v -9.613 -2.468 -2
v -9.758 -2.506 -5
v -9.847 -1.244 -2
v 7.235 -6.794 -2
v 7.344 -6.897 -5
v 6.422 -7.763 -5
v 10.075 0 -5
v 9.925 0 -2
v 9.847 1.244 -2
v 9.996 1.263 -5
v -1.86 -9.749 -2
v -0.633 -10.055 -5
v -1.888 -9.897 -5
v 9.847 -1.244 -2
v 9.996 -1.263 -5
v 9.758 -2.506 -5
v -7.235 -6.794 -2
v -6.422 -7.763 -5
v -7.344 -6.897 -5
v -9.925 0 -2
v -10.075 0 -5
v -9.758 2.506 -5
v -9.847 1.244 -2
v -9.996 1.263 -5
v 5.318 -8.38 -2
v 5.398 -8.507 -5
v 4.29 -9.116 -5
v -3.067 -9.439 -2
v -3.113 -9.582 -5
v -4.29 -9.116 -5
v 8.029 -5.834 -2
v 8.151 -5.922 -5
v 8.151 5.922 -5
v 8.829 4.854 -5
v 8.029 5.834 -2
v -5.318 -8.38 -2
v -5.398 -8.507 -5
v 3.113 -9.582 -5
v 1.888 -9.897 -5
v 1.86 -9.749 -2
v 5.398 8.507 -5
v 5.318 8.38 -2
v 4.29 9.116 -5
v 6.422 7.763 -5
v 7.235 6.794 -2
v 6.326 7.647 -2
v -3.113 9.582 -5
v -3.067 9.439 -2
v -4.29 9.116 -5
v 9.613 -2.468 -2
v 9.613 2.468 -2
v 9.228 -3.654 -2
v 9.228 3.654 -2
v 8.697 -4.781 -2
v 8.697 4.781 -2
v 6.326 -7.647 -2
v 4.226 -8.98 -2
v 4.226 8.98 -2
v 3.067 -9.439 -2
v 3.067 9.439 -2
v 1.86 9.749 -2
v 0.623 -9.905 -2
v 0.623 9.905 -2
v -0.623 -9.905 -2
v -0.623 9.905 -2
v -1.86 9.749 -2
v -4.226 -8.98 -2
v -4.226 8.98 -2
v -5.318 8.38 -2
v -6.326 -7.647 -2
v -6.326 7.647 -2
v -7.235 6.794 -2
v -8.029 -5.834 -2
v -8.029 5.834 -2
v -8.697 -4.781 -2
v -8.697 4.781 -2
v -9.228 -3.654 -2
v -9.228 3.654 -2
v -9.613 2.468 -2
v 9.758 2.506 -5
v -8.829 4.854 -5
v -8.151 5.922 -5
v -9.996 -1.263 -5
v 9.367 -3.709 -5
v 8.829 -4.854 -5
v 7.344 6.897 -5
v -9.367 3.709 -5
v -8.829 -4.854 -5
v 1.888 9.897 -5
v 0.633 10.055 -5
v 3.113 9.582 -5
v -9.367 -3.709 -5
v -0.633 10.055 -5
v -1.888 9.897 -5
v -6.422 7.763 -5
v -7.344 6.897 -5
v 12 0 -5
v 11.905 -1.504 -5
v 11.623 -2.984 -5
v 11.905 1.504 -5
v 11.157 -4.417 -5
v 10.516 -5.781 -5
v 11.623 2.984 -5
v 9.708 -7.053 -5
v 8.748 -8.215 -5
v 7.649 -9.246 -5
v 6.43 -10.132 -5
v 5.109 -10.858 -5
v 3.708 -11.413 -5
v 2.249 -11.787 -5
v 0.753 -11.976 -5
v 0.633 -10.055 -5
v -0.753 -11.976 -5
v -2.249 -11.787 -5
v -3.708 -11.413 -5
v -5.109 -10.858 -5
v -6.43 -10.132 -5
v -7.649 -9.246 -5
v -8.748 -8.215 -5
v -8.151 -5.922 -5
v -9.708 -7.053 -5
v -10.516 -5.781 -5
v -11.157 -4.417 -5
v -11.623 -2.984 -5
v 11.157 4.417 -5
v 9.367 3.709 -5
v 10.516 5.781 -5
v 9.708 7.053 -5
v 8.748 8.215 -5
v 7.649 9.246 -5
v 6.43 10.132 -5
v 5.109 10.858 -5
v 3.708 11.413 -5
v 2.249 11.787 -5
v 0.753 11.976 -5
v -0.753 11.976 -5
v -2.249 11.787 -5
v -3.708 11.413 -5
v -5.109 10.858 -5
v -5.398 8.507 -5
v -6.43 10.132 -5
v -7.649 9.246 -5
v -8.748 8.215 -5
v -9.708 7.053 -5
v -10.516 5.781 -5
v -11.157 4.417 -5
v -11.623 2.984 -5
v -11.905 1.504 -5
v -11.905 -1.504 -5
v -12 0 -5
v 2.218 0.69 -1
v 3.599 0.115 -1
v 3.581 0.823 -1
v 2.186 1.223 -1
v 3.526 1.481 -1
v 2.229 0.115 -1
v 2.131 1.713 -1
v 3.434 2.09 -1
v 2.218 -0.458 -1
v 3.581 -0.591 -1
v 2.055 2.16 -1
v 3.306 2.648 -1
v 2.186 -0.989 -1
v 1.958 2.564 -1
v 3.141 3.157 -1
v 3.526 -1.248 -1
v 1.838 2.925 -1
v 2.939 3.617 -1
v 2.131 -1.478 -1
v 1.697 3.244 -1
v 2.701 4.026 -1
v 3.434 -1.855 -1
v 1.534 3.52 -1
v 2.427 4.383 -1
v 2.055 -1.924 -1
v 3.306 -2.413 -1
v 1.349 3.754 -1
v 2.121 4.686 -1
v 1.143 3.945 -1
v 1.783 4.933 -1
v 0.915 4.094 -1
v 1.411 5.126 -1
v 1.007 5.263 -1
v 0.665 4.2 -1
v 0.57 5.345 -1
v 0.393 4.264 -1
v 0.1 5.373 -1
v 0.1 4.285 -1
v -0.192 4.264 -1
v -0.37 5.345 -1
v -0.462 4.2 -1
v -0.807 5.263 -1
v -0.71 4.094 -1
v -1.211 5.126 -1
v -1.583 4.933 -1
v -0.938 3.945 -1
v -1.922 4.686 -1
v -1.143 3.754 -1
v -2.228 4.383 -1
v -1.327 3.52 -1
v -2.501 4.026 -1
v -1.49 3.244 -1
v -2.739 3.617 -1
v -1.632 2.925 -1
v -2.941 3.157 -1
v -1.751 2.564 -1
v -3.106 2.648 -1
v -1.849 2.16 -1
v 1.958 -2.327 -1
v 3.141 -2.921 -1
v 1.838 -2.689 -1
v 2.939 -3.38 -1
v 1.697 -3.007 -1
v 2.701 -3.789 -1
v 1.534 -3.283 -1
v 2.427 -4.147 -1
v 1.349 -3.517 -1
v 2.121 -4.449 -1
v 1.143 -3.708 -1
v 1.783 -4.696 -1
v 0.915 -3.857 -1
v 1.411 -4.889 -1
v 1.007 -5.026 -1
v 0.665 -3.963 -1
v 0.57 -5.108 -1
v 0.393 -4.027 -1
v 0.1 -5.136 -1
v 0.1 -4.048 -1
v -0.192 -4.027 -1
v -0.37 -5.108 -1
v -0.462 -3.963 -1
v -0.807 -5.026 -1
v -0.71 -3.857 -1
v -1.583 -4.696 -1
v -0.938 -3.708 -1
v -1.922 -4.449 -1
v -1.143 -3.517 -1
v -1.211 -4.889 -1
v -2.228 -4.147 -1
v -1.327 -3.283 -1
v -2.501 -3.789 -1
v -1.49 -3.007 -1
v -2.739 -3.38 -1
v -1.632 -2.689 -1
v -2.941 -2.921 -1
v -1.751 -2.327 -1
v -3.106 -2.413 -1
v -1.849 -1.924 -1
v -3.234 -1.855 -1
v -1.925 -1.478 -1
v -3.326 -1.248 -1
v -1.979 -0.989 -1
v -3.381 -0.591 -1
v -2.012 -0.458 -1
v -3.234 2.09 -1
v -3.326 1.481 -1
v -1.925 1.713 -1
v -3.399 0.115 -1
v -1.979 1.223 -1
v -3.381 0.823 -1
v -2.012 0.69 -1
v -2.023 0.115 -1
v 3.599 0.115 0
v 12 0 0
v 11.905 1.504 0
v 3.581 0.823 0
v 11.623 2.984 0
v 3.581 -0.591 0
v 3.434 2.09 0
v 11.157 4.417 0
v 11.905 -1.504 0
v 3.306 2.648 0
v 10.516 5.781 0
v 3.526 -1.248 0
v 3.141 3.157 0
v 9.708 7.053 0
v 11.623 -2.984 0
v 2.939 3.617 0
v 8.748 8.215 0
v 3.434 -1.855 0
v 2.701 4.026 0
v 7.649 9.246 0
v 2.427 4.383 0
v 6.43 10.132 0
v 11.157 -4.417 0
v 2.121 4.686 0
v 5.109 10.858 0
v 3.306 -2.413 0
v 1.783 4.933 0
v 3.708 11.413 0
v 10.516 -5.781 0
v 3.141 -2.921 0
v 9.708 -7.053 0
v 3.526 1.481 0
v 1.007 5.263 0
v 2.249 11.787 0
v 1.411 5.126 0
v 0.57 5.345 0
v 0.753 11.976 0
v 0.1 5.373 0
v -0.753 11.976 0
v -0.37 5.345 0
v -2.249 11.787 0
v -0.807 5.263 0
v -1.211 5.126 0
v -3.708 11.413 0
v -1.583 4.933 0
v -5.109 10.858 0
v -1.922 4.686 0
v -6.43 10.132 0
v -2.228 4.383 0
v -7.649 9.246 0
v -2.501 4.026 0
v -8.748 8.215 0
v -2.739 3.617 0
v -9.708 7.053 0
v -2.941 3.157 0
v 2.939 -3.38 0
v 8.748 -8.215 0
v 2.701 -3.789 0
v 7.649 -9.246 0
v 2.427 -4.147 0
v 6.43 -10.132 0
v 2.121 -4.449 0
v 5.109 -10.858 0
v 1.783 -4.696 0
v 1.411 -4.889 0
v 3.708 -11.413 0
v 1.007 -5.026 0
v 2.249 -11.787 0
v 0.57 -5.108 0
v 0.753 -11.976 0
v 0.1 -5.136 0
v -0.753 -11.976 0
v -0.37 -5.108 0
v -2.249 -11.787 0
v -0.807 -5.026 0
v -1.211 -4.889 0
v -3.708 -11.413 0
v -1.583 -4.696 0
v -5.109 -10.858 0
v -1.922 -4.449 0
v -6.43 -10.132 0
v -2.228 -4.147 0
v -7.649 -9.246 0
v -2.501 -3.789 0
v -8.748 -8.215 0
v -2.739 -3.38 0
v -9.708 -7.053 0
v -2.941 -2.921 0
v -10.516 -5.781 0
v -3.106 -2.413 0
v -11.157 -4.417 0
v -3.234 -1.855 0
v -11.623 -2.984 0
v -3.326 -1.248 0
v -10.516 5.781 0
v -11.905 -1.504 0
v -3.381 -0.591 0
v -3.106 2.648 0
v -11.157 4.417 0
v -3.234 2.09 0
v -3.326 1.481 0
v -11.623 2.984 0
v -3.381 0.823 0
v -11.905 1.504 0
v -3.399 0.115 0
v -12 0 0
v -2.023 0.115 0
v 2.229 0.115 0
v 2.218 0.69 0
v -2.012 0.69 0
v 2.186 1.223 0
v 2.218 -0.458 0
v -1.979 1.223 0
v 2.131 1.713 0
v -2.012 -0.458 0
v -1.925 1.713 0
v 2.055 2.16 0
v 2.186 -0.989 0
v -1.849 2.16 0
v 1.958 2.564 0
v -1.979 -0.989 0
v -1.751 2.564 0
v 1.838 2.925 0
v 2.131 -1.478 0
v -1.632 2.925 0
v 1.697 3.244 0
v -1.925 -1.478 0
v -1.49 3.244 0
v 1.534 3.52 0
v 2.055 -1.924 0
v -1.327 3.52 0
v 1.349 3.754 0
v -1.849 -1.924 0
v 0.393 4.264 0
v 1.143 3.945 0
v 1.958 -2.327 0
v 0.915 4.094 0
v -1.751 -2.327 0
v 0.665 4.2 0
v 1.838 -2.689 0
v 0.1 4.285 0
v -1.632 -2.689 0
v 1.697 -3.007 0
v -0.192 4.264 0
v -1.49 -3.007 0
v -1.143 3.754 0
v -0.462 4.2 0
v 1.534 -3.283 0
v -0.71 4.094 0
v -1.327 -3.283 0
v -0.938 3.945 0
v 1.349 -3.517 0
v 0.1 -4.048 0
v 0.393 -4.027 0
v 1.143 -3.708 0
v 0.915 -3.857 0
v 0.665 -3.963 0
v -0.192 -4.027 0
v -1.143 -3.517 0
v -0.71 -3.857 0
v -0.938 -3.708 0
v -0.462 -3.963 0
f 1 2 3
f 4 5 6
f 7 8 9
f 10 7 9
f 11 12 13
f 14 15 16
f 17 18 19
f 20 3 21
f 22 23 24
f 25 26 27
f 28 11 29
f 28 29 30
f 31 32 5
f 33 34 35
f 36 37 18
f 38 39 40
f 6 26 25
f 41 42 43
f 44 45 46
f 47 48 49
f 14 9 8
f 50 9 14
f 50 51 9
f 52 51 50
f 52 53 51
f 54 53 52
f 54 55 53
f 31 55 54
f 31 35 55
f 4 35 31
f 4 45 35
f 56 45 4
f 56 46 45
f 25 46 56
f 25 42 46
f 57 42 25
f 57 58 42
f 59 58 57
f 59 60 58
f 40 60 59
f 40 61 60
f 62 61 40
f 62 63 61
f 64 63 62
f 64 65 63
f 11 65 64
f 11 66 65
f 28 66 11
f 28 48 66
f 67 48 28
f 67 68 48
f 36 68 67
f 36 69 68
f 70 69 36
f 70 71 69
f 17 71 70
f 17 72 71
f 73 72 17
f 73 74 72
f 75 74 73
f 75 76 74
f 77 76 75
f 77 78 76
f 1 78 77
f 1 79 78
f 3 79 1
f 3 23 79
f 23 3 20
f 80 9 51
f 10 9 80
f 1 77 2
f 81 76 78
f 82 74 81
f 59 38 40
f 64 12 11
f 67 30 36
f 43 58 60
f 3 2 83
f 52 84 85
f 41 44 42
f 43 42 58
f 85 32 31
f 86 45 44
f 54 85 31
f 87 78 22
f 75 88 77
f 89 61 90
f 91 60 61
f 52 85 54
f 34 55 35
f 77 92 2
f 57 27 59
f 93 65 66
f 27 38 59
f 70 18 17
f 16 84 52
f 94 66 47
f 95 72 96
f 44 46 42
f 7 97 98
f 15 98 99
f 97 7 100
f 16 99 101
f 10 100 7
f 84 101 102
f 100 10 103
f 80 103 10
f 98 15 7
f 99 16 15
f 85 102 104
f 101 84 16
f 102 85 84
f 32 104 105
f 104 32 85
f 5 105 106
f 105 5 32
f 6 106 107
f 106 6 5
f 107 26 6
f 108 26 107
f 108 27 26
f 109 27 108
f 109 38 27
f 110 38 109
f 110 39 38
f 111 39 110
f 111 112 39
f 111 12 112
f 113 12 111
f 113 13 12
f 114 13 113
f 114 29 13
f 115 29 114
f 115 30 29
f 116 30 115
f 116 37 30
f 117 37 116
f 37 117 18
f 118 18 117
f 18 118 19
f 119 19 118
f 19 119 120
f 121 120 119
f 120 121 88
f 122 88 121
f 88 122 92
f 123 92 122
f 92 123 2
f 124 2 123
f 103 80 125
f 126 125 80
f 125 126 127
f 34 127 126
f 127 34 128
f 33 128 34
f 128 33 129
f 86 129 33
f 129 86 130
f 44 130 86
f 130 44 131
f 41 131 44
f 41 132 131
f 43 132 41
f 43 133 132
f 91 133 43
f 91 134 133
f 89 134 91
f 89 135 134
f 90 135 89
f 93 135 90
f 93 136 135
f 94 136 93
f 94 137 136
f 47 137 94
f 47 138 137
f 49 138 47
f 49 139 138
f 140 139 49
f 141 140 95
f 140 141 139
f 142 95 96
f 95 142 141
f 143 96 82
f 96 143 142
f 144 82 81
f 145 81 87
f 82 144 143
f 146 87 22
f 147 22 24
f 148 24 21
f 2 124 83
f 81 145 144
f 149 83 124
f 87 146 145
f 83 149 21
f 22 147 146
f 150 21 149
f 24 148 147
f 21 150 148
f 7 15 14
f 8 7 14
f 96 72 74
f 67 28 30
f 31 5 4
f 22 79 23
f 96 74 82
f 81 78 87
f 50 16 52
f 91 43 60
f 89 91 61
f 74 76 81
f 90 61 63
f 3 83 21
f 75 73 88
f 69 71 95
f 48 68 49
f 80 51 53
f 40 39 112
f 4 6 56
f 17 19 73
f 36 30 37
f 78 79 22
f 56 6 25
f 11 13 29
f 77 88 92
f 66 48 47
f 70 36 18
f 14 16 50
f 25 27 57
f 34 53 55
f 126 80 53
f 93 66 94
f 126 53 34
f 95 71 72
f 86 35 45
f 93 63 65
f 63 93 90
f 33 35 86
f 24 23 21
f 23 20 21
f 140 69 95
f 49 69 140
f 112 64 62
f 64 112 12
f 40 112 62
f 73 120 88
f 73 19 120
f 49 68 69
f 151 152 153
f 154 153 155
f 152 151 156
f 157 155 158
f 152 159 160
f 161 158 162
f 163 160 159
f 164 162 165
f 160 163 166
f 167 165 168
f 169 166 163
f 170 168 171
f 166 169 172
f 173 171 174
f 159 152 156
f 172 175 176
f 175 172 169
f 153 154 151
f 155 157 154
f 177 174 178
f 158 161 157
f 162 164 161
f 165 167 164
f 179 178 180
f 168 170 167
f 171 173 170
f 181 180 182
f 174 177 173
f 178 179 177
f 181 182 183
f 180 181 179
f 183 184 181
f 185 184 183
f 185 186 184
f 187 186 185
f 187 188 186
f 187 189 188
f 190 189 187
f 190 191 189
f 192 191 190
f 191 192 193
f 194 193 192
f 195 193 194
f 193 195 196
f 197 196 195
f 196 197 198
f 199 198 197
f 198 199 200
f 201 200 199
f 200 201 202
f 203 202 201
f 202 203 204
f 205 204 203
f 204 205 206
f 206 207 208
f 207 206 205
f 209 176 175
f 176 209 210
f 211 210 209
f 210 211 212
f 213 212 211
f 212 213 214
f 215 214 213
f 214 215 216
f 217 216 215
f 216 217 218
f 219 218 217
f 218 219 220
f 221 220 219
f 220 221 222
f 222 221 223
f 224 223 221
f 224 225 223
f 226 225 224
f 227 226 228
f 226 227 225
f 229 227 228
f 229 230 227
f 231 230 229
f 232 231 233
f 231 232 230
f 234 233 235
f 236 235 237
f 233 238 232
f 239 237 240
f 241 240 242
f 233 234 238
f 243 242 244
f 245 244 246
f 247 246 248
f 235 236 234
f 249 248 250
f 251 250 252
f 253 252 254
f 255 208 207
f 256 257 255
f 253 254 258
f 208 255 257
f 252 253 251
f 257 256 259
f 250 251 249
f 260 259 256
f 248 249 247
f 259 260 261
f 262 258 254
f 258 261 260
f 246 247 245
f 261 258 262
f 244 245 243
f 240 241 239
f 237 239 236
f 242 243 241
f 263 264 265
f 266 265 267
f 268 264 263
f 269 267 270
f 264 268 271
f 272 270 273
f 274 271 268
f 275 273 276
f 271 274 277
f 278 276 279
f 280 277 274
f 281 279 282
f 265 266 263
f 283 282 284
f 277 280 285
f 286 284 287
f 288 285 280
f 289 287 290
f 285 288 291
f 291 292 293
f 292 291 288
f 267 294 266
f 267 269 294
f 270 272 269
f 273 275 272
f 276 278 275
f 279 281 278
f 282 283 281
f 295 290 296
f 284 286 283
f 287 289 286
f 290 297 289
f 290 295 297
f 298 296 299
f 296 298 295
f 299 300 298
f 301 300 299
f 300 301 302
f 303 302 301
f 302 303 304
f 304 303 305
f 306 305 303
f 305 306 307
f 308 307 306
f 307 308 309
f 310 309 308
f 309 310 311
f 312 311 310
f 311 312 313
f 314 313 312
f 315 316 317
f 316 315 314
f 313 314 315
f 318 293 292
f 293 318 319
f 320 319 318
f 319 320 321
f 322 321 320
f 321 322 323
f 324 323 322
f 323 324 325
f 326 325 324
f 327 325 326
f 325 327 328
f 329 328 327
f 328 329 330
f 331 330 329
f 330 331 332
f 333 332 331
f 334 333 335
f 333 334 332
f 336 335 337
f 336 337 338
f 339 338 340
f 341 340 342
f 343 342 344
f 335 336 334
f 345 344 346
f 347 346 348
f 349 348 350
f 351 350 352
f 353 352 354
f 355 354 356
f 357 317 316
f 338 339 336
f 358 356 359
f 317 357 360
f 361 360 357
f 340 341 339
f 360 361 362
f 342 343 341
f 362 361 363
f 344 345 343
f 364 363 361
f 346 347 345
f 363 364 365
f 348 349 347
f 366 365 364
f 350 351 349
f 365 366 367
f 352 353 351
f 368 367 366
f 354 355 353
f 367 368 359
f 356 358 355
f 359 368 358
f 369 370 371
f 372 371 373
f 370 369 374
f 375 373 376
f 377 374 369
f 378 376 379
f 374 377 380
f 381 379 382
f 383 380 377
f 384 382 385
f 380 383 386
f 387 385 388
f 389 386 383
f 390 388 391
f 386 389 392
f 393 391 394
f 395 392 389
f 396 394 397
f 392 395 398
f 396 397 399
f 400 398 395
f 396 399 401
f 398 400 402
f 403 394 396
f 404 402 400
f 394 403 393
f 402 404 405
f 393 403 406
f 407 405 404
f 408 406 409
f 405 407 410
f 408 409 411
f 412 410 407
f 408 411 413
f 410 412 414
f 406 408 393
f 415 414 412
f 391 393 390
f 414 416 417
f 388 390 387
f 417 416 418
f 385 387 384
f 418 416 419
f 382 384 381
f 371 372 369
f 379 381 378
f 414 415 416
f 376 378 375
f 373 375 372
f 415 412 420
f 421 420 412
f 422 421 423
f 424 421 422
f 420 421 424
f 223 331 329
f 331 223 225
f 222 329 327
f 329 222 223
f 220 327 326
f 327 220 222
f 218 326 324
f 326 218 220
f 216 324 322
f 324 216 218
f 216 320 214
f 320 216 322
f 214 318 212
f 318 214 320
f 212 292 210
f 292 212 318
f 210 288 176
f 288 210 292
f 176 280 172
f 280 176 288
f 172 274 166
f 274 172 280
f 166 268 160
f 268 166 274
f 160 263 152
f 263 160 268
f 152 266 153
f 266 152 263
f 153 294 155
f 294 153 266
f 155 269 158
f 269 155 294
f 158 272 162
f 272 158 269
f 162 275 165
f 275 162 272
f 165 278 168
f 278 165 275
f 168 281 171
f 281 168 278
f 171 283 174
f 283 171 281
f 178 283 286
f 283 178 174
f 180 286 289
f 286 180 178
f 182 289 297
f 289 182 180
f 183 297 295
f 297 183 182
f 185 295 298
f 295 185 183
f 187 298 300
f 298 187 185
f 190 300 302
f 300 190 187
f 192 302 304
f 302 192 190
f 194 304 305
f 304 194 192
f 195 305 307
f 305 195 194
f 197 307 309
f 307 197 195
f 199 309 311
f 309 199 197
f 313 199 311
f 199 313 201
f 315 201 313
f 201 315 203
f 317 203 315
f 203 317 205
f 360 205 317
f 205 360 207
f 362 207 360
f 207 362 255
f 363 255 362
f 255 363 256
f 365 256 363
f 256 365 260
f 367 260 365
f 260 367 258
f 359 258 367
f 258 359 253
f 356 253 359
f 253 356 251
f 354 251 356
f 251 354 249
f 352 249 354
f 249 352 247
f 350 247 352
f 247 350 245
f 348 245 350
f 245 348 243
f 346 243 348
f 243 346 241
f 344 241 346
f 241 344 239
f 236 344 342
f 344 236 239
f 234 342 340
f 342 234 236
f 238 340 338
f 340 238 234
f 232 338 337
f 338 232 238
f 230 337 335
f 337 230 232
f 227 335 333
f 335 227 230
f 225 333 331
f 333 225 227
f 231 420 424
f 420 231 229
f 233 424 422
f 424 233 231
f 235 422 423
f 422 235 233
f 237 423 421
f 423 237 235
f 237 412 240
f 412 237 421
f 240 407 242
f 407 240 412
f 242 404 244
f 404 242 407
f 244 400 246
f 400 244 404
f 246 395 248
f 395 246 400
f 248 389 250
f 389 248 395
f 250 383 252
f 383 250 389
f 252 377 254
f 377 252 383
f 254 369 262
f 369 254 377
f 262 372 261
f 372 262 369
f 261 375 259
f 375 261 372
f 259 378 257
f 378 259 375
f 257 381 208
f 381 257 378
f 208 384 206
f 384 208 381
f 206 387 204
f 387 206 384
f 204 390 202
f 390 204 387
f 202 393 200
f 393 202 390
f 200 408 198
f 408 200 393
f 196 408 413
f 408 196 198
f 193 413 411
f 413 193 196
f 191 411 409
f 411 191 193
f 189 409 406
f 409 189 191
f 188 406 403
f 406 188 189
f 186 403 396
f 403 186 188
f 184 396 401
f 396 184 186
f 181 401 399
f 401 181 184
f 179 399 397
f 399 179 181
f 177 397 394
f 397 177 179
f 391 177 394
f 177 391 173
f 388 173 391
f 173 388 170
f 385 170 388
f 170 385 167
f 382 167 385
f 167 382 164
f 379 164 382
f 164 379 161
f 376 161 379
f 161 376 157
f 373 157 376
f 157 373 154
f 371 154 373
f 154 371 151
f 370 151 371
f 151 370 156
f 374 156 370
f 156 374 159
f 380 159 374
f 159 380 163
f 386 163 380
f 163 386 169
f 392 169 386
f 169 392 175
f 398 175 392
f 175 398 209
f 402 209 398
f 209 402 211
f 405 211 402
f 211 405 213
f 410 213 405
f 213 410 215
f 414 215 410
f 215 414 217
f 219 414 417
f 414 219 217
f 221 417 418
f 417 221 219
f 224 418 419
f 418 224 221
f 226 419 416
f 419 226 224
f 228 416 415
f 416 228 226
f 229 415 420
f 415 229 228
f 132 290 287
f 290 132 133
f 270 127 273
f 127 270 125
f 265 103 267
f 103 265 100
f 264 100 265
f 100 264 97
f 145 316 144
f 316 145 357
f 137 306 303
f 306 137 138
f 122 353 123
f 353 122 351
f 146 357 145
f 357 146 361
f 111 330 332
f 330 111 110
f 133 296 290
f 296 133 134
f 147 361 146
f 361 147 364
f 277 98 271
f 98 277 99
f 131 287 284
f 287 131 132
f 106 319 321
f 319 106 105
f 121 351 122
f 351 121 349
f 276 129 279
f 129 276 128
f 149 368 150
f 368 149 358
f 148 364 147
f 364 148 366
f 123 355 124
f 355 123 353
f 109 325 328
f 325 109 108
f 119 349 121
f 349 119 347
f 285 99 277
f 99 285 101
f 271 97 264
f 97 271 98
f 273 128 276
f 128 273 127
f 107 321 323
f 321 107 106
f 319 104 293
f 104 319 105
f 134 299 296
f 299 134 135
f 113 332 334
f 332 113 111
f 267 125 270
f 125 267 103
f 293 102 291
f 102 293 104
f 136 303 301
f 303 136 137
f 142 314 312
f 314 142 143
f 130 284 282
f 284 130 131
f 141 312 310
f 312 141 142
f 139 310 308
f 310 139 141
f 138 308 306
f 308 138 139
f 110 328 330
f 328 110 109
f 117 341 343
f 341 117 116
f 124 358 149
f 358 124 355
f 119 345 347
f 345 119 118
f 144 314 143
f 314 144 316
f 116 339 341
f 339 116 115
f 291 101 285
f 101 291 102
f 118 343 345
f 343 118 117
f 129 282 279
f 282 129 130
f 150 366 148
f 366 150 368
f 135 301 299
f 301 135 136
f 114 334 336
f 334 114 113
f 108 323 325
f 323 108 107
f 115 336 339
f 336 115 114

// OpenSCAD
$fn = 50;


difference() {
	union() {
		translate(v = [0, 0, -5.0000000000]) {
			cylinder(h = 5, r = 12.0000000000);
		}
	}
	union() {
		#translate(v = [0, 0, -5.0000000000]) {
			cylinder(h = 3, r1 = 10.0750000000, r2 = 9.9250000000);
		}
		translate(v = [0, 0, -1]) {
			linear_extrude(height = 1) {
				text(font = "Impact", halign = "center", size = 10, text = "0", valign = "center");
			}
		}
	}
}
